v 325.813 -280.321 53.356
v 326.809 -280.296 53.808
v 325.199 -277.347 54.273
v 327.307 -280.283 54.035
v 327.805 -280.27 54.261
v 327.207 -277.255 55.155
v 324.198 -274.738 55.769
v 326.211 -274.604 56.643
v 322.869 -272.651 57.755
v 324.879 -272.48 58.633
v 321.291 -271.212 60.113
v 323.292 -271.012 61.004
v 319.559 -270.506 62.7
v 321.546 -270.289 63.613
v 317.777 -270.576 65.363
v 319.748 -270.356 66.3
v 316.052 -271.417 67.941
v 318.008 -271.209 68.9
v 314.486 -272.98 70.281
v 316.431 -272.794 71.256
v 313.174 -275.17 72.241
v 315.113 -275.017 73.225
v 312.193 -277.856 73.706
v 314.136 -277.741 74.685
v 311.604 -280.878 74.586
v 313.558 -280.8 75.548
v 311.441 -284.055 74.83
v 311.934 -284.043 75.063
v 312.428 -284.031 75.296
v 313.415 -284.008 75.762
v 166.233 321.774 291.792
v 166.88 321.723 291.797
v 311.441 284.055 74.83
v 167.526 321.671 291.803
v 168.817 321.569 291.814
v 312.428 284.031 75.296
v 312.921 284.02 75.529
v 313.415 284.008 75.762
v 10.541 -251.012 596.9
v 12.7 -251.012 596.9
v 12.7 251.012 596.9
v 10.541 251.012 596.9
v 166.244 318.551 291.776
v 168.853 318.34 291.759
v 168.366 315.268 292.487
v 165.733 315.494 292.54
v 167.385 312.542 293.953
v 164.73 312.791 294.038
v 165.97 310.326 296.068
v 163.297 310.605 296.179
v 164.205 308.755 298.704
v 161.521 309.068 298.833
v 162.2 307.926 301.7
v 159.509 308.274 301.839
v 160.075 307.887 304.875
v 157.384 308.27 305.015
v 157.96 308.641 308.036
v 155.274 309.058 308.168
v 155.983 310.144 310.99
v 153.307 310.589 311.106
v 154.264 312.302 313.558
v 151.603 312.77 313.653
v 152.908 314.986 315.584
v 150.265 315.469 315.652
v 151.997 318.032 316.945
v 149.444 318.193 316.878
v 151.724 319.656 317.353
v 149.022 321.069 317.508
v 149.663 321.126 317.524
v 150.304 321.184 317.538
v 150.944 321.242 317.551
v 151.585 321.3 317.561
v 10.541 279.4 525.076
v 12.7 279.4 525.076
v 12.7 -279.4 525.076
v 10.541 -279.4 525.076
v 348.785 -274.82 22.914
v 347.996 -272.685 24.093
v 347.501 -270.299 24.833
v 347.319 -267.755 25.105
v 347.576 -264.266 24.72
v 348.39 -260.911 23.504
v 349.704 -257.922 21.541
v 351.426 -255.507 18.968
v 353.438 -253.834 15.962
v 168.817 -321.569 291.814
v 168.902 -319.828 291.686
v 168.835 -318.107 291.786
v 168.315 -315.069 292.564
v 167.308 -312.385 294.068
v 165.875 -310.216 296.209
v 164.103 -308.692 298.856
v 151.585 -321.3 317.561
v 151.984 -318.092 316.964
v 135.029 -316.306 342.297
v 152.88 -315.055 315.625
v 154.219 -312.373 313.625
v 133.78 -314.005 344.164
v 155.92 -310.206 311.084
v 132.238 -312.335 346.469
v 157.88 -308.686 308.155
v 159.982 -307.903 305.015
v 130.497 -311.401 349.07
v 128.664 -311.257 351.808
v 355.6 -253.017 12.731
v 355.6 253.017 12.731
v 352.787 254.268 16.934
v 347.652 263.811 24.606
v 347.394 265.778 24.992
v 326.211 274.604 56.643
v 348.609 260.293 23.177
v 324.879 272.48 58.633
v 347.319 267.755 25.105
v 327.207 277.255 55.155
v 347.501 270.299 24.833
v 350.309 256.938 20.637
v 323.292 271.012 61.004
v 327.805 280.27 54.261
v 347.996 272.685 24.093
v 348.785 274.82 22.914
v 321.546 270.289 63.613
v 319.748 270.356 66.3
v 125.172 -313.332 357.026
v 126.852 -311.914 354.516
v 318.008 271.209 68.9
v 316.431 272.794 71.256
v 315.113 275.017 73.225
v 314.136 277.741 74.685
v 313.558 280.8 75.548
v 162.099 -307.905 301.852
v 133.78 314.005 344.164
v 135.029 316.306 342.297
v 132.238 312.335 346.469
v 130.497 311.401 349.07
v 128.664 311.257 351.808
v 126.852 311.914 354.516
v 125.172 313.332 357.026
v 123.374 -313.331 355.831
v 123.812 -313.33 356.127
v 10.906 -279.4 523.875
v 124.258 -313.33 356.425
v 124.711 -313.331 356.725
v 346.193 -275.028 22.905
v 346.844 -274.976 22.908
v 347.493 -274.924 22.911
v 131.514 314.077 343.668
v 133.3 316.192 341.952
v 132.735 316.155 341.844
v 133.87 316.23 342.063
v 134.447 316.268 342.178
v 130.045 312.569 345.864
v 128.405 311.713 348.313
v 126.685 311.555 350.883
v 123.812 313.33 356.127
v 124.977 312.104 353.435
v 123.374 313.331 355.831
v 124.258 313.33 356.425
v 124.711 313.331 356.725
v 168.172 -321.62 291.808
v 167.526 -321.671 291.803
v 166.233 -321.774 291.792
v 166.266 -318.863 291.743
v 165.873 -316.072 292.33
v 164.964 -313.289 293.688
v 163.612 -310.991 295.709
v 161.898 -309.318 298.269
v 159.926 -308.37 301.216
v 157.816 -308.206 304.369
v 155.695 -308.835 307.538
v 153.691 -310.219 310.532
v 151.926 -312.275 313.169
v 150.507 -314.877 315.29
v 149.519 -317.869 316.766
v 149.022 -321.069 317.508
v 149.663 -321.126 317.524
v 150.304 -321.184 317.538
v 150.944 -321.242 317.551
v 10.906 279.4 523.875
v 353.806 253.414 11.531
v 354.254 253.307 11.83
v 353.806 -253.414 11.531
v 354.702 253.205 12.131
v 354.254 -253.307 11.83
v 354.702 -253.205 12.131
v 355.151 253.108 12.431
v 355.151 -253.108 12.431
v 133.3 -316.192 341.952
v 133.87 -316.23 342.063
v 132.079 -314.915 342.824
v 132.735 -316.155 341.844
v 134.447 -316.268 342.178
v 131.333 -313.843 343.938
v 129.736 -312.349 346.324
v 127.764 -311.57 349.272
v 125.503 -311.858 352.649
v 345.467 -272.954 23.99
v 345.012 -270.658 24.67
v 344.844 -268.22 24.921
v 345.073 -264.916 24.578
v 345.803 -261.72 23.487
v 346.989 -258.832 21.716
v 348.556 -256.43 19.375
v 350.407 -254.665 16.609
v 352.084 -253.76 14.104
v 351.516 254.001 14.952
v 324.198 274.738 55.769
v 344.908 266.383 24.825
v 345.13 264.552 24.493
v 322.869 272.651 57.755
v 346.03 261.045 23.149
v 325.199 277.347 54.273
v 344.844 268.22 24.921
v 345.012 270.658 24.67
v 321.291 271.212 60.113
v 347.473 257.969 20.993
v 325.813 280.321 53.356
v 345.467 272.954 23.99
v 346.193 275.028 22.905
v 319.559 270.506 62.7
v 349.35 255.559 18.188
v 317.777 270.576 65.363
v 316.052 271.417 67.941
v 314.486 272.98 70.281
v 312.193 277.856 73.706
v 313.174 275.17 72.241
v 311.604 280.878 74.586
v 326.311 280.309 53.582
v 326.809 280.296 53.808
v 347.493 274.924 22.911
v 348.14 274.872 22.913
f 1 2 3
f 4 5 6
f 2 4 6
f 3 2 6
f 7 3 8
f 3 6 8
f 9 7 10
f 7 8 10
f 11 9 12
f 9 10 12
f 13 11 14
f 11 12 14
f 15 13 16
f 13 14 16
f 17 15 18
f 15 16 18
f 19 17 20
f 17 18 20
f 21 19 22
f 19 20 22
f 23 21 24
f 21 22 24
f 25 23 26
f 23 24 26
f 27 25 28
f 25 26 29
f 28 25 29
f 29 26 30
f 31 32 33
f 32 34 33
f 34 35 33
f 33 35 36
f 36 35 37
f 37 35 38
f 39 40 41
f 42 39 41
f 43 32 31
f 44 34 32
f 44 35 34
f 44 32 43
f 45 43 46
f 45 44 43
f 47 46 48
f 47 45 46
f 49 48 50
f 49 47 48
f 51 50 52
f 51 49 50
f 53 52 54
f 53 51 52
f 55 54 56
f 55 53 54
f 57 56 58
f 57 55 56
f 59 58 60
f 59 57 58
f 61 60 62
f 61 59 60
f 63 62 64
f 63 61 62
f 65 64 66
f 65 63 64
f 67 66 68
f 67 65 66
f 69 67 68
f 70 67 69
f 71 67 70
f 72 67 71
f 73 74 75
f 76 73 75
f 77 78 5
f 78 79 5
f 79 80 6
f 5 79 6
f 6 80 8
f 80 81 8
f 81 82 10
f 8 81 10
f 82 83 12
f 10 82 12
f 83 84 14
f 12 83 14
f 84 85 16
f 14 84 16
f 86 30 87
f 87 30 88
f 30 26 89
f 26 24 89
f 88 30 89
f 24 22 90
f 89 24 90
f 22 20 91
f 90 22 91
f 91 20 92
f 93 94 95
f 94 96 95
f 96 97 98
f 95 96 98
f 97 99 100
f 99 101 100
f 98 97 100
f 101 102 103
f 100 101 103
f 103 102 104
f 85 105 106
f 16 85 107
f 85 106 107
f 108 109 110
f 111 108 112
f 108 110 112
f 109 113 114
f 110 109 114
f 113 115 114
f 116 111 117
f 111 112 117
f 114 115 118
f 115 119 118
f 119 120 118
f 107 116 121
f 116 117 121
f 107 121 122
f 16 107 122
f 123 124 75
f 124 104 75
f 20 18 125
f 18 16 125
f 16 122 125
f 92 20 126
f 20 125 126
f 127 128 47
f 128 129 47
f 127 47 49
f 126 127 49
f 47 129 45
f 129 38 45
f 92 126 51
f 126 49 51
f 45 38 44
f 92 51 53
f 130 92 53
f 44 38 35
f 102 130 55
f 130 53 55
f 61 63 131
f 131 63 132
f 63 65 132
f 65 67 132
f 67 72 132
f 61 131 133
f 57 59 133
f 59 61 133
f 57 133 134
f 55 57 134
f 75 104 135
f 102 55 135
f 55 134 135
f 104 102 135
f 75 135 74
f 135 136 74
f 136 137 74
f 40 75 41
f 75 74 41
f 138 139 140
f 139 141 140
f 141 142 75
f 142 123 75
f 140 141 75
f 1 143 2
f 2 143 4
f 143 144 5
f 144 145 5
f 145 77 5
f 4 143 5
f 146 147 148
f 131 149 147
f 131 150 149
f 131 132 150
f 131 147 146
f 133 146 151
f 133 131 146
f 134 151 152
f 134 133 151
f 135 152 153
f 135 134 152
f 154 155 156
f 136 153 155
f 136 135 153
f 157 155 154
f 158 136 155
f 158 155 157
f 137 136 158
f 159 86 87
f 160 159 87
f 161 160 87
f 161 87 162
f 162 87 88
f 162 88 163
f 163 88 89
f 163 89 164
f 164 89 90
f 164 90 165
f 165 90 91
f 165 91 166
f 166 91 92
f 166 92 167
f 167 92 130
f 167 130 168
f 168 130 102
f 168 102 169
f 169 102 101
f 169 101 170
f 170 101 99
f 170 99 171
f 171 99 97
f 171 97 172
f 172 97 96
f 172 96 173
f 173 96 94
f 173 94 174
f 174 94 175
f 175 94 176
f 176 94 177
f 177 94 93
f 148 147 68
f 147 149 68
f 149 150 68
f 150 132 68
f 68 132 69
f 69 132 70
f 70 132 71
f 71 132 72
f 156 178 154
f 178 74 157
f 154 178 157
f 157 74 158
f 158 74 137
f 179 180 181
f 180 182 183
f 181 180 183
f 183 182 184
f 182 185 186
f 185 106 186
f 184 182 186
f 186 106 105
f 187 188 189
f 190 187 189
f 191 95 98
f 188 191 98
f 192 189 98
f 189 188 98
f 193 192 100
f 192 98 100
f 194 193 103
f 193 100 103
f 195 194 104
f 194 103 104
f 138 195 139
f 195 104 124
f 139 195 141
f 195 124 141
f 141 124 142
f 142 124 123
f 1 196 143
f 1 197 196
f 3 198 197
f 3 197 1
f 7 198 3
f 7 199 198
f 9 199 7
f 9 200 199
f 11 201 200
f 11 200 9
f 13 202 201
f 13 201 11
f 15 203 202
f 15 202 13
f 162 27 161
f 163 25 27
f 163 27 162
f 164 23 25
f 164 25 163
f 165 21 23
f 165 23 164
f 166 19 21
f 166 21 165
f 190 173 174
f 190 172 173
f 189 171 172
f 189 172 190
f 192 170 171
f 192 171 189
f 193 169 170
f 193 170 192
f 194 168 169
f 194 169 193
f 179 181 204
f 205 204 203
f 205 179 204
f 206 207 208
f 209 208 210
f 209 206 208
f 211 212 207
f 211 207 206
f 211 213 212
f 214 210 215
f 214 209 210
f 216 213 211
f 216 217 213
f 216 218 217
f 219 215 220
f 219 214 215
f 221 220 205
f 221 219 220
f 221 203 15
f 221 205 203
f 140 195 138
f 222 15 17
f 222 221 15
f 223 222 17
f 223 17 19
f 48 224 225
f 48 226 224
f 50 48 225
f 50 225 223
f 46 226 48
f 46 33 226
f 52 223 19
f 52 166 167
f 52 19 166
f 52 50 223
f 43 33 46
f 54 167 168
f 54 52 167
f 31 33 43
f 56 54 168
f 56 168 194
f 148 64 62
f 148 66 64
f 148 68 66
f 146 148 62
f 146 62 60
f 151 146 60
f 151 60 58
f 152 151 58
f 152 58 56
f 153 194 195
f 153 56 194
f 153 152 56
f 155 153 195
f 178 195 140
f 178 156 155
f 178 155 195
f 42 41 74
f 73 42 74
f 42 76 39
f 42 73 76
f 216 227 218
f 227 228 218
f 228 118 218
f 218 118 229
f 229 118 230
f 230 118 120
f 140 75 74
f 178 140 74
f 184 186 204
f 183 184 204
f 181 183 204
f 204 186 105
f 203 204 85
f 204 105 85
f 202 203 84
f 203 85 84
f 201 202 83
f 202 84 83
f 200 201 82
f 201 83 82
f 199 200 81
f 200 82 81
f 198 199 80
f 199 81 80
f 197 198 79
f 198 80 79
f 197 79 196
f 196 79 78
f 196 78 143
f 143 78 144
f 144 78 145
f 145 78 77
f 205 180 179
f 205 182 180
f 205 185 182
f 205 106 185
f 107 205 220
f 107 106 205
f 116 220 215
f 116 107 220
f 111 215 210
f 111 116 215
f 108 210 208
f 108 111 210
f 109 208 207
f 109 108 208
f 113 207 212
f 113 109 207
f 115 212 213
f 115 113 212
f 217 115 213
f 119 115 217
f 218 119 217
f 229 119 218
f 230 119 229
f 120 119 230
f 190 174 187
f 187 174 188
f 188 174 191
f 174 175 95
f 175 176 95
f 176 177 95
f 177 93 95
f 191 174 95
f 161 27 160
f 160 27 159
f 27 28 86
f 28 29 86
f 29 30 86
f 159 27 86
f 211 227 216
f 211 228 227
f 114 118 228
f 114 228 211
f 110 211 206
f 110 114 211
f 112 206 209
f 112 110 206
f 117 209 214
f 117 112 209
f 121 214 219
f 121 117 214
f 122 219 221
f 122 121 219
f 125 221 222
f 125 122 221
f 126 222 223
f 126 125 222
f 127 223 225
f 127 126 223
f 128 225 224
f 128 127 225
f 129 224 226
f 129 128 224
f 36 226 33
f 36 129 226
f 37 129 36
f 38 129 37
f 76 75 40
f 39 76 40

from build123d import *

# Parameters (mm, degrees)
BOSS_EXTRUDE1_DEPTH = 2.159
BOSS_EXTRUDE2_DEPTH = 2.159
SKETCH5_R           = 12.954
CUT_EXTRUDE1_DEPTH  = 621.665
SKETCH6_R           = 12.954
CUT_EXTRUDE2_DEPTH  = 1027.457309168
SKETCH7_R           = 12.954
CUT_EXTRUDE3_DEPTH  = 1027.457309168
SKETCH8_R           = 12.954
CUT_EXTRUDE4_DEPTH  = 1145.829689035


with BuildPart() as part:
    # Sketch3 → Boss-Extrude1 (new body)
    with BuildSketch(Plane(origin=(251.476706106, 0, 168.307390472), x_dir=(-0.5562007015720102, 0, 0.8310480007621723), z_dir=(-0.8310480007621723, 0, -0.5562007015720102))):
        Polygon((-187.204535341, 273.05), (-187.204535341, 0), (429.299541391, 0), (429.299541391, 279.4), (164.402521358, 323.85), align=None)
        Polygon((-187.204535341, 0), (-187.204535341, -273.05), (164.402521358, -323.85), (429.299541391, -279.4), (429.299541391, 0), align=None)
    extrude(amount=BOSS_EXTRUDE1_DEPTH)

    # Sketch5 → Cut-Extrude1 (cut)
    with BuildSketch(Plane(origin=(825.5, 177.8, 47.625), x_dir=(-0.07152915299803123, 0.013455979276857365, 0.9973477412081931), z_dir=(-0.9801553180651386, 0.18438565389344194, -0.07278381074741123))):
        Circle(SKETCH5_R)
    cut_extrude1 = extrude(amount=CUT_EXTRUDE1_DEPTH, mode=Mode.SUBTRACT)

    # Sketch6 → Cut-Extrude2 (cut, through all)
    with BuildSketch(Plane(origin=(825.5, 227.0125, 304.8), x_dir=(-0.42445842434756254, 0.047278784890198794, 0.9042122331066369), z_dir=(-0.8986546712744607, 0.1000976737805711, -0.4270834081304366))):
        Circle(SKETCH6_R)
    cut_extrude2 = extrude(amount=CUT_EXTRUDE2_DEPTH, mode=Mode.SUBTRACT)

    # Sketch7 → Cut-Extrude3 (cut, through all)
    with BuildSketch(Plane(origin=(825.5, 227.0125, 304.8), x_dir=(-0.00023887502122916035, 3.372792217408492e-05, 0.9999999709005754), z_dir=(-0.9901785863890273, 0.13980811442036903, -0.00024124437506688719))):
        Circle(SKETCH7_R)
    cut_extrude3 = extrude(amount=CUT_EXTRUDE3_DEPTH, mode=Mode.SUBTRACT)

    # Sketch8 → Cut-Extrude4 (cut, through all)
    with BuildSketch(Plane(origin=(825.5, 220.292352851, 603.464669867), x_dir=(-0.3334143845379491, 0.04979061934850228, 0.9414646793205114), z_dir=(-0.9311392123382828, 0.13905218320513943, -0.33711163965654883))):
        Circle(SKETCH8_R)
    cut_extrude4 = extrude(amount=CUT_EXTRUDE4_DEPTH, mode=Mode.SUBTRACT)

    # Mirror1: Cut-Extrude1, Cut-Extrude2, Cut-Extrude3, Cut-Extrude4 across plane
    add(cut_extrude1.mirror(Plane.ZX), mode=Mode.SUBTRACT)
    add(cut_extrude2.mirror(Plane.ZX), mode=Mode.SUBTRACT)
    add(cut_extrude3.mirror(Plane.ZX), mode=Mode.SUBTRACT)
    add(cut_extrude4.mirror(Plane.ZX), mode=Mode.SUBTRACT)


with BuildPart() as body_2:
    # Sketch4 → Boss-Extrude2 (new body)
    with BuildSketch(Plane.ZY.offset(-12.7)):
        Polygon((525.075916073, 0), (525.075916073, -279.4), (596.9, -251.012323537), (596.9, 0), align=None)
        Polygon((525.075916073, 279.4), (525.075916073, 0), (596.9, 0), (596.9, 251.012323537), align=None)
    extrude(amount=BOSS_EXTRUDE2_DEPTH)


solid = Compound([part.part, body_2.part])
